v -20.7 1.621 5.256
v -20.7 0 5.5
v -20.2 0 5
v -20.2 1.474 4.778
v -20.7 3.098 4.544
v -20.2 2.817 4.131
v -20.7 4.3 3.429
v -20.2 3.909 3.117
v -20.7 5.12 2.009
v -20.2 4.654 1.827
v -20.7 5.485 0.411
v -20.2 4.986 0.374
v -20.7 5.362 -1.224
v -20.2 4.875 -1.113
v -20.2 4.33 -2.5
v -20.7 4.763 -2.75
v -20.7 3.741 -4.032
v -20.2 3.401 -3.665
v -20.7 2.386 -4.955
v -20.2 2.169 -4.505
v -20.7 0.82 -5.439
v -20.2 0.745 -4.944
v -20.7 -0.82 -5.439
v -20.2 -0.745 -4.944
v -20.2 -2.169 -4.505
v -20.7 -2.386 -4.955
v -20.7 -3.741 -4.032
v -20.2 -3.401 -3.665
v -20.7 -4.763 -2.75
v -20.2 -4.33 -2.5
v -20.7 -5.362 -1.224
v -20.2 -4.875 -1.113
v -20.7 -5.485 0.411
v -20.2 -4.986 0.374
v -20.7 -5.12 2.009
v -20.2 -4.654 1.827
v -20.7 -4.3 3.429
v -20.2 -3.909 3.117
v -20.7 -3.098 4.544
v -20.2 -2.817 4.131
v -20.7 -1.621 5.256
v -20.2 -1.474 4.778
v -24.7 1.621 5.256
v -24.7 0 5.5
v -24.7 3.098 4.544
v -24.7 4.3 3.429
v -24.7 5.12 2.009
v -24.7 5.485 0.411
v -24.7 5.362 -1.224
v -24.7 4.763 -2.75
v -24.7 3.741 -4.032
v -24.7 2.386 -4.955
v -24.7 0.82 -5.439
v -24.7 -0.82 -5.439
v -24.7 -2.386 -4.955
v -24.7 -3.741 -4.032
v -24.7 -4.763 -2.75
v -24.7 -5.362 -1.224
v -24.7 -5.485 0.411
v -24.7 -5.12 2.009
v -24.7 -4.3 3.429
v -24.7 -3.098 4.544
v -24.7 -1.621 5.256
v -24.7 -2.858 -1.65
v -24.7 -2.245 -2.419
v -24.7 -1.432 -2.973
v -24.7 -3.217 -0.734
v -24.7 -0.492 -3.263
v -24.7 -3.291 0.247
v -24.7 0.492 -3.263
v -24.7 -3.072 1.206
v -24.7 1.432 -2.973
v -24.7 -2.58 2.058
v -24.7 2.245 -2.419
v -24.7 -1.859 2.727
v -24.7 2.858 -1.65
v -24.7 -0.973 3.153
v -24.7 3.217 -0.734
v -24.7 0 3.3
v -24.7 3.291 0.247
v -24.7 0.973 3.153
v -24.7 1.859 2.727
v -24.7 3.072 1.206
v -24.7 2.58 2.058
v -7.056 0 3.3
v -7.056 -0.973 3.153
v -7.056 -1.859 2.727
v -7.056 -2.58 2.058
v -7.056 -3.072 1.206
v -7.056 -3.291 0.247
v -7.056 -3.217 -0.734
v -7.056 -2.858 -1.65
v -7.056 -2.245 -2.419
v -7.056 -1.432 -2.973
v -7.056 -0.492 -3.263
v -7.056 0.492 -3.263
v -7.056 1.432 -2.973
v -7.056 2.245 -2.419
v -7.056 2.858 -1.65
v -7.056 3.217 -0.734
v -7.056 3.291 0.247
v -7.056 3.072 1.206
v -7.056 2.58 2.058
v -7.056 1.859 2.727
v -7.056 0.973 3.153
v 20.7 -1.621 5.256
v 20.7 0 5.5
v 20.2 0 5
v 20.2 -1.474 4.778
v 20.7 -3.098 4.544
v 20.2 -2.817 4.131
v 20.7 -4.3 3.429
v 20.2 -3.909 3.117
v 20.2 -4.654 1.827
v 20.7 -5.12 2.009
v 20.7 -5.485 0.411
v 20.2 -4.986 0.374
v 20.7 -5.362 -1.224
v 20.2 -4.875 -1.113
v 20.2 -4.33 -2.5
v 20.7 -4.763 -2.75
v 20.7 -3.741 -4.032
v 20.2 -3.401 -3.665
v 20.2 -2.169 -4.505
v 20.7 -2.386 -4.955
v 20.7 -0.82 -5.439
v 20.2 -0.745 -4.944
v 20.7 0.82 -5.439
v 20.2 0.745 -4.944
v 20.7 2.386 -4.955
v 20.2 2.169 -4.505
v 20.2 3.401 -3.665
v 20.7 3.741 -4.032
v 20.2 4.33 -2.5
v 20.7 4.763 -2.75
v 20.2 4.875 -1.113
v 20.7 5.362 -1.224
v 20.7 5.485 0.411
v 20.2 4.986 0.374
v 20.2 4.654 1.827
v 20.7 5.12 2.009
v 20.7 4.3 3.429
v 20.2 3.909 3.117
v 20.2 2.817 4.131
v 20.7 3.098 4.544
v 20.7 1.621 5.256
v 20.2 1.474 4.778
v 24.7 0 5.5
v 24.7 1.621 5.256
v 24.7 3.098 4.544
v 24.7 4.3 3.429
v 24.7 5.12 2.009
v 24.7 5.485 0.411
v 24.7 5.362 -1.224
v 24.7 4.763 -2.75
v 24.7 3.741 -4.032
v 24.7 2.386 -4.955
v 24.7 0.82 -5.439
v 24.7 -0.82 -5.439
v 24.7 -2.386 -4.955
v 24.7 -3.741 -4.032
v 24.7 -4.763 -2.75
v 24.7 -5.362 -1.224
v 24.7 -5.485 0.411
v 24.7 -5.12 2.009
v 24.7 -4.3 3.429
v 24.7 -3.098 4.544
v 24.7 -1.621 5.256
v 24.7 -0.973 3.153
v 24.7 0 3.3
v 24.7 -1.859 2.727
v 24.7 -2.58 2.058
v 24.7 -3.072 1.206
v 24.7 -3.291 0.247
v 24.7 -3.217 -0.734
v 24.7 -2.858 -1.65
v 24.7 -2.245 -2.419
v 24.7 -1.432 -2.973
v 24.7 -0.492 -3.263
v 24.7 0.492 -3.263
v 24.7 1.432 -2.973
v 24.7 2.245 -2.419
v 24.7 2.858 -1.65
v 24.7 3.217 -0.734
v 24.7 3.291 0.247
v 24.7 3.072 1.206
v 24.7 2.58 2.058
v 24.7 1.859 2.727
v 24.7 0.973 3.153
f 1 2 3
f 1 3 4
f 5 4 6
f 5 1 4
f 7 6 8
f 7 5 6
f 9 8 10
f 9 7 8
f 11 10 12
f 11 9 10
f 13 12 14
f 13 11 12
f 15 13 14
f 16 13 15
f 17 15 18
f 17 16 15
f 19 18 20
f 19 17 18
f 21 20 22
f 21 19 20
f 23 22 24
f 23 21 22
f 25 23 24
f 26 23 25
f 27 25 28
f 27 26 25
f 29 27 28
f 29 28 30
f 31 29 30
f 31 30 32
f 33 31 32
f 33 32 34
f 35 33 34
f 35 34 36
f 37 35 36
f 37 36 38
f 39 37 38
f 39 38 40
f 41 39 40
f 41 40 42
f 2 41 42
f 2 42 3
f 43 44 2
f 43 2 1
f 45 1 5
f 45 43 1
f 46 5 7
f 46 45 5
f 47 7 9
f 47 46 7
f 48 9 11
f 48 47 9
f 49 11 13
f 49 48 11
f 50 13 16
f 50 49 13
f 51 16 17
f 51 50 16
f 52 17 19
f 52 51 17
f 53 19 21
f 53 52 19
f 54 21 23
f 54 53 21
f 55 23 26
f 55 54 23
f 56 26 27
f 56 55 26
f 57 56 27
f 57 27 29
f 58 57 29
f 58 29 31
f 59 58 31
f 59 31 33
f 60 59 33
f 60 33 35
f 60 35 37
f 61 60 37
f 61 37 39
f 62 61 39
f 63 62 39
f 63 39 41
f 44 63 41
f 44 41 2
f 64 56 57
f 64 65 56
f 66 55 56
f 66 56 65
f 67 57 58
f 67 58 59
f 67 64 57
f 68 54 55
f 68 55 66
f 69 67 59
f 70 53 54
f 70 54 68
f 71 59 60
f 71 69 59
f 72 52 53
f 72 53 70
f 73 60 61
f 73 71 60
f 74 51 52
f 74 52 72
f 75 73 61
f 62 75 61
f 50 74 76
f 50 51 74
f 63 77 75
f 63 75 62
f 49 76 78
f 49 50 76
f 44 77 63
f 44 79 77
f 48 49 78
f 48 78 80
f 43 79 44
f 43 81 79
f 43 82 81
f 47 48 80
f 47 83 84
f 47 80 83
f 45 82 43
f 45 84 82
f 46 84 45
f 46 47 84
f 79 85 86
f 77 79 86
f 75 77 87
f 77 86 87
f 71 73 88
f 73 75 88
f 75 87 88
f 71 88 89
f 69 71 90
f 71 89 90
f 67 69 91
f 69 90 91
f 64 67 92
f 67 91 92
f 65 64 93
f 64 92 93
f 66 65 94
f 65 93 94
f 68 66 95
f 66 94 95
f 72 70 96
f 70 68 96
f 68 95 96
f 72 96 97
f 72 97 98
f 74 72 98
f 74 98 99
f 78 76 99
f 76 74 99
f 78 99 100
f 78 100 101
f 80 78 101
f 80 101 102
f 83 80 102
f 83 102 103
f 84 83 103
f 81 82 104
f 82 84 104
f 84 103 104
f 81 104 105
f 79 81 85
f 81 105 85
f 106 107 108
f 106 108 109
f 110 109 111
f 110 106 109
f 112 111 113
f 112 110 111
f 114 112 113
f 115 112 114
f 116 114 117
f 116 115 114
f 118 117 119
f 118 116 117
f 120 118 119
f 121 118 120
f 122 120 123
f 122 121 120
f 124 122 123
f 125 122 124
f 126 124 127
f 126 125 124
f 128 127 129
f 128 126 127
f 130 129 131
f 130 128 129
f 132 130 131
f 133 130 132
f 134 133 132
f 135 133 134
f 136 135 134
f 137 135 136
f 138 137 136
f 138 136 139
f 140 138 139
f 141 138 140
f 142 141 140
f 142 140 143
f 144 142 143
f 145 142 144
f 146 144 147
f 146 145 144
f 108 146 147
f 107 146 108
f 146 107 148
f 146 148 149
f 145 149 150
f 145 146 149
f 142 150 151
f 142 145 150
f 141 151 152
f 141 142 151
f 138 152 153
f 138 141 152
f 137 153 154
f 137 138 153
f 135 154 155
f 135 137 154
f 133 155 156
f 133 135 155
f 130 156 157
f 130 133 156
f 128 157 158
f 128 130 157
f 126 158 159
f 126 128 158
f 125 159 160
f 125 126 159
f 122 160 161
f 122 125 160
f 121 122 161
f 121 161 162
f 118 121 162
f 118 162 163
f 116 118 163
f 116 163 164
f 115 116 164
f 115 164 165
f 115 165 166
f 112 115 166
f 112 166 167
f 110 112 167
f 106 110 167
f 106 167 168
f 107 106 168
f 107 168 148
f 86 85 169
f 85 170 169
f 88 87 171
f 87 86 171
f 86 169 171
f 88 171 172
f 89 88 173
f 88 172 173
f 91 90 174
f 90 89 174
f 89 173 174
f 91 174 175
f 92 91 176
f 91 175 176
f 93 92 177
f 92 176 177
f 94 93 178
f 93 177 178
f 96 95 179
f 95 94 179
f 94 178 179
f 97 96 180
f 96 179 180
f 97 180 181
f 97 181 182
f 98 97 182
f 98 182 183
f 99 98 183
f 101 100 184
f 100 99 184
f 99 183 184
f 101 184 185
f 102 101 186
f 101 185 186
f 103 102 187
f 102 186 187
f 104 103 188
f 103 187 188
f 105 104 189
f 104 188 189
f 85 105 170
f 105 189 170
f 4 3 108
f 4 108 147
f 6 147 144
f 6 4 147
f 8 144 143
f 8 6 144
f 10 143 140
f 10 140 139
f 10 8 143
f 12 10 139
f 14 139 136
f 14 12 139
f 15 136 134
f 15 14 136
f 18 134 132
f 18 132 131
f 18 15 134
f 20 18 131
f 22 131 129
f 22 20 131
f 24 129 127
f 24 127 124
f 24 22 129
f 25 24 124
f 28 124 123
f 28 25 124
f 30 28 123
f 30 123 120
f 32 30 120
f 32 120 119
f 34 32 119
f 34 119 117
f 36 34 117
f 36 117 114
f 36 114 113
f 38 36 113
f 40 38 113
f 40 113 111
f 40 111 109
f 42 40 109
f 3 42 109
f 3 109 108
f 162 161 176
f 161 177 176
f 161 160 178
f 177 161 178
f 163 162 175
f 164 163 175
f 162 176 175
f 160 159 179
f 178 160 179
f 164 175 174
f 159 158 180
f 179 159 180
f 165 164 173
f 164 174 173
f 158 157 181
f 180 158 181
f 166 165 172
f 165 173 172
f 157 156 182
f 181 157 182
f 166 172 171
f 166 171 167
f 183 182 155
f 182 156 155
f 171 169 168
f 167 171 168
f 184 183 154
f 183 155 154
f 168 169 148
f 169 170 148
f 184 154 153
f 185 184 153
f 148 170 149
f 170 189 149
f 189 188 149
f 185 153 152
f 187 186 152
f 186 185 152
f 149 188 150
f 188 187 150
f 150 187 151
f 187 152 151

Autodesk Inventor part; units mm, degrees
ref_plane "YZ Plane" through (0, 0, 0) normal (1, 0, 0) x (0, 1, 0)
ref_plane "XZ Plane" through (0, 0, 0) normal (0, 1, 0) x (-1, 0, 0)
ref_plane "XY Plane" through (0, 0, 0) normal (0, 0, 1) x (1, 0, 0)
sketch "Sketch1" plane through (0, 0, 0) normal (0, 1, 0) x (-1, 0, 0)
  line L0 (7.056, 3.3) -> (-24.7, 3.3)
  line L1 (-24.7, 3.3) -> (-24.7, 5.5)
  line L2 (-24.7, 5.5) -> (-20.7, 5.5)
  line L3 (-20.7, 5.5) -> (-20.2, 5)
  line L4 (-20.2, 5) -> (20.2, 5)
  line L5 (20.2, 5) -> (20.7, 5.5)
  line L6 (20.7, 5.5) -> (24.7, 5.5)
  line L7 (24.7, 5.5) -> (24.7, 3.3)
  line L8 (24.7, 3.3) -> (7.056, 3.3)
  line L9 (0, -1.1) -> (0, 6.6) construction
  line L10 (-34.58, 0) -> (34.58, 0) construction
  point P0 (0, 0)
  dimension "d0" = 3.3
  dimension "d1" = 40.4
  dimension "d2" = 49.4
  dimension "d3" = 0.5
  dimension "d4" = 5
revolve "Revolution1" add sketch "Sketch1" angle 360 about axis through (0, 0, 0) along (-1, 0, 0)
properties part number "roller_ext"
